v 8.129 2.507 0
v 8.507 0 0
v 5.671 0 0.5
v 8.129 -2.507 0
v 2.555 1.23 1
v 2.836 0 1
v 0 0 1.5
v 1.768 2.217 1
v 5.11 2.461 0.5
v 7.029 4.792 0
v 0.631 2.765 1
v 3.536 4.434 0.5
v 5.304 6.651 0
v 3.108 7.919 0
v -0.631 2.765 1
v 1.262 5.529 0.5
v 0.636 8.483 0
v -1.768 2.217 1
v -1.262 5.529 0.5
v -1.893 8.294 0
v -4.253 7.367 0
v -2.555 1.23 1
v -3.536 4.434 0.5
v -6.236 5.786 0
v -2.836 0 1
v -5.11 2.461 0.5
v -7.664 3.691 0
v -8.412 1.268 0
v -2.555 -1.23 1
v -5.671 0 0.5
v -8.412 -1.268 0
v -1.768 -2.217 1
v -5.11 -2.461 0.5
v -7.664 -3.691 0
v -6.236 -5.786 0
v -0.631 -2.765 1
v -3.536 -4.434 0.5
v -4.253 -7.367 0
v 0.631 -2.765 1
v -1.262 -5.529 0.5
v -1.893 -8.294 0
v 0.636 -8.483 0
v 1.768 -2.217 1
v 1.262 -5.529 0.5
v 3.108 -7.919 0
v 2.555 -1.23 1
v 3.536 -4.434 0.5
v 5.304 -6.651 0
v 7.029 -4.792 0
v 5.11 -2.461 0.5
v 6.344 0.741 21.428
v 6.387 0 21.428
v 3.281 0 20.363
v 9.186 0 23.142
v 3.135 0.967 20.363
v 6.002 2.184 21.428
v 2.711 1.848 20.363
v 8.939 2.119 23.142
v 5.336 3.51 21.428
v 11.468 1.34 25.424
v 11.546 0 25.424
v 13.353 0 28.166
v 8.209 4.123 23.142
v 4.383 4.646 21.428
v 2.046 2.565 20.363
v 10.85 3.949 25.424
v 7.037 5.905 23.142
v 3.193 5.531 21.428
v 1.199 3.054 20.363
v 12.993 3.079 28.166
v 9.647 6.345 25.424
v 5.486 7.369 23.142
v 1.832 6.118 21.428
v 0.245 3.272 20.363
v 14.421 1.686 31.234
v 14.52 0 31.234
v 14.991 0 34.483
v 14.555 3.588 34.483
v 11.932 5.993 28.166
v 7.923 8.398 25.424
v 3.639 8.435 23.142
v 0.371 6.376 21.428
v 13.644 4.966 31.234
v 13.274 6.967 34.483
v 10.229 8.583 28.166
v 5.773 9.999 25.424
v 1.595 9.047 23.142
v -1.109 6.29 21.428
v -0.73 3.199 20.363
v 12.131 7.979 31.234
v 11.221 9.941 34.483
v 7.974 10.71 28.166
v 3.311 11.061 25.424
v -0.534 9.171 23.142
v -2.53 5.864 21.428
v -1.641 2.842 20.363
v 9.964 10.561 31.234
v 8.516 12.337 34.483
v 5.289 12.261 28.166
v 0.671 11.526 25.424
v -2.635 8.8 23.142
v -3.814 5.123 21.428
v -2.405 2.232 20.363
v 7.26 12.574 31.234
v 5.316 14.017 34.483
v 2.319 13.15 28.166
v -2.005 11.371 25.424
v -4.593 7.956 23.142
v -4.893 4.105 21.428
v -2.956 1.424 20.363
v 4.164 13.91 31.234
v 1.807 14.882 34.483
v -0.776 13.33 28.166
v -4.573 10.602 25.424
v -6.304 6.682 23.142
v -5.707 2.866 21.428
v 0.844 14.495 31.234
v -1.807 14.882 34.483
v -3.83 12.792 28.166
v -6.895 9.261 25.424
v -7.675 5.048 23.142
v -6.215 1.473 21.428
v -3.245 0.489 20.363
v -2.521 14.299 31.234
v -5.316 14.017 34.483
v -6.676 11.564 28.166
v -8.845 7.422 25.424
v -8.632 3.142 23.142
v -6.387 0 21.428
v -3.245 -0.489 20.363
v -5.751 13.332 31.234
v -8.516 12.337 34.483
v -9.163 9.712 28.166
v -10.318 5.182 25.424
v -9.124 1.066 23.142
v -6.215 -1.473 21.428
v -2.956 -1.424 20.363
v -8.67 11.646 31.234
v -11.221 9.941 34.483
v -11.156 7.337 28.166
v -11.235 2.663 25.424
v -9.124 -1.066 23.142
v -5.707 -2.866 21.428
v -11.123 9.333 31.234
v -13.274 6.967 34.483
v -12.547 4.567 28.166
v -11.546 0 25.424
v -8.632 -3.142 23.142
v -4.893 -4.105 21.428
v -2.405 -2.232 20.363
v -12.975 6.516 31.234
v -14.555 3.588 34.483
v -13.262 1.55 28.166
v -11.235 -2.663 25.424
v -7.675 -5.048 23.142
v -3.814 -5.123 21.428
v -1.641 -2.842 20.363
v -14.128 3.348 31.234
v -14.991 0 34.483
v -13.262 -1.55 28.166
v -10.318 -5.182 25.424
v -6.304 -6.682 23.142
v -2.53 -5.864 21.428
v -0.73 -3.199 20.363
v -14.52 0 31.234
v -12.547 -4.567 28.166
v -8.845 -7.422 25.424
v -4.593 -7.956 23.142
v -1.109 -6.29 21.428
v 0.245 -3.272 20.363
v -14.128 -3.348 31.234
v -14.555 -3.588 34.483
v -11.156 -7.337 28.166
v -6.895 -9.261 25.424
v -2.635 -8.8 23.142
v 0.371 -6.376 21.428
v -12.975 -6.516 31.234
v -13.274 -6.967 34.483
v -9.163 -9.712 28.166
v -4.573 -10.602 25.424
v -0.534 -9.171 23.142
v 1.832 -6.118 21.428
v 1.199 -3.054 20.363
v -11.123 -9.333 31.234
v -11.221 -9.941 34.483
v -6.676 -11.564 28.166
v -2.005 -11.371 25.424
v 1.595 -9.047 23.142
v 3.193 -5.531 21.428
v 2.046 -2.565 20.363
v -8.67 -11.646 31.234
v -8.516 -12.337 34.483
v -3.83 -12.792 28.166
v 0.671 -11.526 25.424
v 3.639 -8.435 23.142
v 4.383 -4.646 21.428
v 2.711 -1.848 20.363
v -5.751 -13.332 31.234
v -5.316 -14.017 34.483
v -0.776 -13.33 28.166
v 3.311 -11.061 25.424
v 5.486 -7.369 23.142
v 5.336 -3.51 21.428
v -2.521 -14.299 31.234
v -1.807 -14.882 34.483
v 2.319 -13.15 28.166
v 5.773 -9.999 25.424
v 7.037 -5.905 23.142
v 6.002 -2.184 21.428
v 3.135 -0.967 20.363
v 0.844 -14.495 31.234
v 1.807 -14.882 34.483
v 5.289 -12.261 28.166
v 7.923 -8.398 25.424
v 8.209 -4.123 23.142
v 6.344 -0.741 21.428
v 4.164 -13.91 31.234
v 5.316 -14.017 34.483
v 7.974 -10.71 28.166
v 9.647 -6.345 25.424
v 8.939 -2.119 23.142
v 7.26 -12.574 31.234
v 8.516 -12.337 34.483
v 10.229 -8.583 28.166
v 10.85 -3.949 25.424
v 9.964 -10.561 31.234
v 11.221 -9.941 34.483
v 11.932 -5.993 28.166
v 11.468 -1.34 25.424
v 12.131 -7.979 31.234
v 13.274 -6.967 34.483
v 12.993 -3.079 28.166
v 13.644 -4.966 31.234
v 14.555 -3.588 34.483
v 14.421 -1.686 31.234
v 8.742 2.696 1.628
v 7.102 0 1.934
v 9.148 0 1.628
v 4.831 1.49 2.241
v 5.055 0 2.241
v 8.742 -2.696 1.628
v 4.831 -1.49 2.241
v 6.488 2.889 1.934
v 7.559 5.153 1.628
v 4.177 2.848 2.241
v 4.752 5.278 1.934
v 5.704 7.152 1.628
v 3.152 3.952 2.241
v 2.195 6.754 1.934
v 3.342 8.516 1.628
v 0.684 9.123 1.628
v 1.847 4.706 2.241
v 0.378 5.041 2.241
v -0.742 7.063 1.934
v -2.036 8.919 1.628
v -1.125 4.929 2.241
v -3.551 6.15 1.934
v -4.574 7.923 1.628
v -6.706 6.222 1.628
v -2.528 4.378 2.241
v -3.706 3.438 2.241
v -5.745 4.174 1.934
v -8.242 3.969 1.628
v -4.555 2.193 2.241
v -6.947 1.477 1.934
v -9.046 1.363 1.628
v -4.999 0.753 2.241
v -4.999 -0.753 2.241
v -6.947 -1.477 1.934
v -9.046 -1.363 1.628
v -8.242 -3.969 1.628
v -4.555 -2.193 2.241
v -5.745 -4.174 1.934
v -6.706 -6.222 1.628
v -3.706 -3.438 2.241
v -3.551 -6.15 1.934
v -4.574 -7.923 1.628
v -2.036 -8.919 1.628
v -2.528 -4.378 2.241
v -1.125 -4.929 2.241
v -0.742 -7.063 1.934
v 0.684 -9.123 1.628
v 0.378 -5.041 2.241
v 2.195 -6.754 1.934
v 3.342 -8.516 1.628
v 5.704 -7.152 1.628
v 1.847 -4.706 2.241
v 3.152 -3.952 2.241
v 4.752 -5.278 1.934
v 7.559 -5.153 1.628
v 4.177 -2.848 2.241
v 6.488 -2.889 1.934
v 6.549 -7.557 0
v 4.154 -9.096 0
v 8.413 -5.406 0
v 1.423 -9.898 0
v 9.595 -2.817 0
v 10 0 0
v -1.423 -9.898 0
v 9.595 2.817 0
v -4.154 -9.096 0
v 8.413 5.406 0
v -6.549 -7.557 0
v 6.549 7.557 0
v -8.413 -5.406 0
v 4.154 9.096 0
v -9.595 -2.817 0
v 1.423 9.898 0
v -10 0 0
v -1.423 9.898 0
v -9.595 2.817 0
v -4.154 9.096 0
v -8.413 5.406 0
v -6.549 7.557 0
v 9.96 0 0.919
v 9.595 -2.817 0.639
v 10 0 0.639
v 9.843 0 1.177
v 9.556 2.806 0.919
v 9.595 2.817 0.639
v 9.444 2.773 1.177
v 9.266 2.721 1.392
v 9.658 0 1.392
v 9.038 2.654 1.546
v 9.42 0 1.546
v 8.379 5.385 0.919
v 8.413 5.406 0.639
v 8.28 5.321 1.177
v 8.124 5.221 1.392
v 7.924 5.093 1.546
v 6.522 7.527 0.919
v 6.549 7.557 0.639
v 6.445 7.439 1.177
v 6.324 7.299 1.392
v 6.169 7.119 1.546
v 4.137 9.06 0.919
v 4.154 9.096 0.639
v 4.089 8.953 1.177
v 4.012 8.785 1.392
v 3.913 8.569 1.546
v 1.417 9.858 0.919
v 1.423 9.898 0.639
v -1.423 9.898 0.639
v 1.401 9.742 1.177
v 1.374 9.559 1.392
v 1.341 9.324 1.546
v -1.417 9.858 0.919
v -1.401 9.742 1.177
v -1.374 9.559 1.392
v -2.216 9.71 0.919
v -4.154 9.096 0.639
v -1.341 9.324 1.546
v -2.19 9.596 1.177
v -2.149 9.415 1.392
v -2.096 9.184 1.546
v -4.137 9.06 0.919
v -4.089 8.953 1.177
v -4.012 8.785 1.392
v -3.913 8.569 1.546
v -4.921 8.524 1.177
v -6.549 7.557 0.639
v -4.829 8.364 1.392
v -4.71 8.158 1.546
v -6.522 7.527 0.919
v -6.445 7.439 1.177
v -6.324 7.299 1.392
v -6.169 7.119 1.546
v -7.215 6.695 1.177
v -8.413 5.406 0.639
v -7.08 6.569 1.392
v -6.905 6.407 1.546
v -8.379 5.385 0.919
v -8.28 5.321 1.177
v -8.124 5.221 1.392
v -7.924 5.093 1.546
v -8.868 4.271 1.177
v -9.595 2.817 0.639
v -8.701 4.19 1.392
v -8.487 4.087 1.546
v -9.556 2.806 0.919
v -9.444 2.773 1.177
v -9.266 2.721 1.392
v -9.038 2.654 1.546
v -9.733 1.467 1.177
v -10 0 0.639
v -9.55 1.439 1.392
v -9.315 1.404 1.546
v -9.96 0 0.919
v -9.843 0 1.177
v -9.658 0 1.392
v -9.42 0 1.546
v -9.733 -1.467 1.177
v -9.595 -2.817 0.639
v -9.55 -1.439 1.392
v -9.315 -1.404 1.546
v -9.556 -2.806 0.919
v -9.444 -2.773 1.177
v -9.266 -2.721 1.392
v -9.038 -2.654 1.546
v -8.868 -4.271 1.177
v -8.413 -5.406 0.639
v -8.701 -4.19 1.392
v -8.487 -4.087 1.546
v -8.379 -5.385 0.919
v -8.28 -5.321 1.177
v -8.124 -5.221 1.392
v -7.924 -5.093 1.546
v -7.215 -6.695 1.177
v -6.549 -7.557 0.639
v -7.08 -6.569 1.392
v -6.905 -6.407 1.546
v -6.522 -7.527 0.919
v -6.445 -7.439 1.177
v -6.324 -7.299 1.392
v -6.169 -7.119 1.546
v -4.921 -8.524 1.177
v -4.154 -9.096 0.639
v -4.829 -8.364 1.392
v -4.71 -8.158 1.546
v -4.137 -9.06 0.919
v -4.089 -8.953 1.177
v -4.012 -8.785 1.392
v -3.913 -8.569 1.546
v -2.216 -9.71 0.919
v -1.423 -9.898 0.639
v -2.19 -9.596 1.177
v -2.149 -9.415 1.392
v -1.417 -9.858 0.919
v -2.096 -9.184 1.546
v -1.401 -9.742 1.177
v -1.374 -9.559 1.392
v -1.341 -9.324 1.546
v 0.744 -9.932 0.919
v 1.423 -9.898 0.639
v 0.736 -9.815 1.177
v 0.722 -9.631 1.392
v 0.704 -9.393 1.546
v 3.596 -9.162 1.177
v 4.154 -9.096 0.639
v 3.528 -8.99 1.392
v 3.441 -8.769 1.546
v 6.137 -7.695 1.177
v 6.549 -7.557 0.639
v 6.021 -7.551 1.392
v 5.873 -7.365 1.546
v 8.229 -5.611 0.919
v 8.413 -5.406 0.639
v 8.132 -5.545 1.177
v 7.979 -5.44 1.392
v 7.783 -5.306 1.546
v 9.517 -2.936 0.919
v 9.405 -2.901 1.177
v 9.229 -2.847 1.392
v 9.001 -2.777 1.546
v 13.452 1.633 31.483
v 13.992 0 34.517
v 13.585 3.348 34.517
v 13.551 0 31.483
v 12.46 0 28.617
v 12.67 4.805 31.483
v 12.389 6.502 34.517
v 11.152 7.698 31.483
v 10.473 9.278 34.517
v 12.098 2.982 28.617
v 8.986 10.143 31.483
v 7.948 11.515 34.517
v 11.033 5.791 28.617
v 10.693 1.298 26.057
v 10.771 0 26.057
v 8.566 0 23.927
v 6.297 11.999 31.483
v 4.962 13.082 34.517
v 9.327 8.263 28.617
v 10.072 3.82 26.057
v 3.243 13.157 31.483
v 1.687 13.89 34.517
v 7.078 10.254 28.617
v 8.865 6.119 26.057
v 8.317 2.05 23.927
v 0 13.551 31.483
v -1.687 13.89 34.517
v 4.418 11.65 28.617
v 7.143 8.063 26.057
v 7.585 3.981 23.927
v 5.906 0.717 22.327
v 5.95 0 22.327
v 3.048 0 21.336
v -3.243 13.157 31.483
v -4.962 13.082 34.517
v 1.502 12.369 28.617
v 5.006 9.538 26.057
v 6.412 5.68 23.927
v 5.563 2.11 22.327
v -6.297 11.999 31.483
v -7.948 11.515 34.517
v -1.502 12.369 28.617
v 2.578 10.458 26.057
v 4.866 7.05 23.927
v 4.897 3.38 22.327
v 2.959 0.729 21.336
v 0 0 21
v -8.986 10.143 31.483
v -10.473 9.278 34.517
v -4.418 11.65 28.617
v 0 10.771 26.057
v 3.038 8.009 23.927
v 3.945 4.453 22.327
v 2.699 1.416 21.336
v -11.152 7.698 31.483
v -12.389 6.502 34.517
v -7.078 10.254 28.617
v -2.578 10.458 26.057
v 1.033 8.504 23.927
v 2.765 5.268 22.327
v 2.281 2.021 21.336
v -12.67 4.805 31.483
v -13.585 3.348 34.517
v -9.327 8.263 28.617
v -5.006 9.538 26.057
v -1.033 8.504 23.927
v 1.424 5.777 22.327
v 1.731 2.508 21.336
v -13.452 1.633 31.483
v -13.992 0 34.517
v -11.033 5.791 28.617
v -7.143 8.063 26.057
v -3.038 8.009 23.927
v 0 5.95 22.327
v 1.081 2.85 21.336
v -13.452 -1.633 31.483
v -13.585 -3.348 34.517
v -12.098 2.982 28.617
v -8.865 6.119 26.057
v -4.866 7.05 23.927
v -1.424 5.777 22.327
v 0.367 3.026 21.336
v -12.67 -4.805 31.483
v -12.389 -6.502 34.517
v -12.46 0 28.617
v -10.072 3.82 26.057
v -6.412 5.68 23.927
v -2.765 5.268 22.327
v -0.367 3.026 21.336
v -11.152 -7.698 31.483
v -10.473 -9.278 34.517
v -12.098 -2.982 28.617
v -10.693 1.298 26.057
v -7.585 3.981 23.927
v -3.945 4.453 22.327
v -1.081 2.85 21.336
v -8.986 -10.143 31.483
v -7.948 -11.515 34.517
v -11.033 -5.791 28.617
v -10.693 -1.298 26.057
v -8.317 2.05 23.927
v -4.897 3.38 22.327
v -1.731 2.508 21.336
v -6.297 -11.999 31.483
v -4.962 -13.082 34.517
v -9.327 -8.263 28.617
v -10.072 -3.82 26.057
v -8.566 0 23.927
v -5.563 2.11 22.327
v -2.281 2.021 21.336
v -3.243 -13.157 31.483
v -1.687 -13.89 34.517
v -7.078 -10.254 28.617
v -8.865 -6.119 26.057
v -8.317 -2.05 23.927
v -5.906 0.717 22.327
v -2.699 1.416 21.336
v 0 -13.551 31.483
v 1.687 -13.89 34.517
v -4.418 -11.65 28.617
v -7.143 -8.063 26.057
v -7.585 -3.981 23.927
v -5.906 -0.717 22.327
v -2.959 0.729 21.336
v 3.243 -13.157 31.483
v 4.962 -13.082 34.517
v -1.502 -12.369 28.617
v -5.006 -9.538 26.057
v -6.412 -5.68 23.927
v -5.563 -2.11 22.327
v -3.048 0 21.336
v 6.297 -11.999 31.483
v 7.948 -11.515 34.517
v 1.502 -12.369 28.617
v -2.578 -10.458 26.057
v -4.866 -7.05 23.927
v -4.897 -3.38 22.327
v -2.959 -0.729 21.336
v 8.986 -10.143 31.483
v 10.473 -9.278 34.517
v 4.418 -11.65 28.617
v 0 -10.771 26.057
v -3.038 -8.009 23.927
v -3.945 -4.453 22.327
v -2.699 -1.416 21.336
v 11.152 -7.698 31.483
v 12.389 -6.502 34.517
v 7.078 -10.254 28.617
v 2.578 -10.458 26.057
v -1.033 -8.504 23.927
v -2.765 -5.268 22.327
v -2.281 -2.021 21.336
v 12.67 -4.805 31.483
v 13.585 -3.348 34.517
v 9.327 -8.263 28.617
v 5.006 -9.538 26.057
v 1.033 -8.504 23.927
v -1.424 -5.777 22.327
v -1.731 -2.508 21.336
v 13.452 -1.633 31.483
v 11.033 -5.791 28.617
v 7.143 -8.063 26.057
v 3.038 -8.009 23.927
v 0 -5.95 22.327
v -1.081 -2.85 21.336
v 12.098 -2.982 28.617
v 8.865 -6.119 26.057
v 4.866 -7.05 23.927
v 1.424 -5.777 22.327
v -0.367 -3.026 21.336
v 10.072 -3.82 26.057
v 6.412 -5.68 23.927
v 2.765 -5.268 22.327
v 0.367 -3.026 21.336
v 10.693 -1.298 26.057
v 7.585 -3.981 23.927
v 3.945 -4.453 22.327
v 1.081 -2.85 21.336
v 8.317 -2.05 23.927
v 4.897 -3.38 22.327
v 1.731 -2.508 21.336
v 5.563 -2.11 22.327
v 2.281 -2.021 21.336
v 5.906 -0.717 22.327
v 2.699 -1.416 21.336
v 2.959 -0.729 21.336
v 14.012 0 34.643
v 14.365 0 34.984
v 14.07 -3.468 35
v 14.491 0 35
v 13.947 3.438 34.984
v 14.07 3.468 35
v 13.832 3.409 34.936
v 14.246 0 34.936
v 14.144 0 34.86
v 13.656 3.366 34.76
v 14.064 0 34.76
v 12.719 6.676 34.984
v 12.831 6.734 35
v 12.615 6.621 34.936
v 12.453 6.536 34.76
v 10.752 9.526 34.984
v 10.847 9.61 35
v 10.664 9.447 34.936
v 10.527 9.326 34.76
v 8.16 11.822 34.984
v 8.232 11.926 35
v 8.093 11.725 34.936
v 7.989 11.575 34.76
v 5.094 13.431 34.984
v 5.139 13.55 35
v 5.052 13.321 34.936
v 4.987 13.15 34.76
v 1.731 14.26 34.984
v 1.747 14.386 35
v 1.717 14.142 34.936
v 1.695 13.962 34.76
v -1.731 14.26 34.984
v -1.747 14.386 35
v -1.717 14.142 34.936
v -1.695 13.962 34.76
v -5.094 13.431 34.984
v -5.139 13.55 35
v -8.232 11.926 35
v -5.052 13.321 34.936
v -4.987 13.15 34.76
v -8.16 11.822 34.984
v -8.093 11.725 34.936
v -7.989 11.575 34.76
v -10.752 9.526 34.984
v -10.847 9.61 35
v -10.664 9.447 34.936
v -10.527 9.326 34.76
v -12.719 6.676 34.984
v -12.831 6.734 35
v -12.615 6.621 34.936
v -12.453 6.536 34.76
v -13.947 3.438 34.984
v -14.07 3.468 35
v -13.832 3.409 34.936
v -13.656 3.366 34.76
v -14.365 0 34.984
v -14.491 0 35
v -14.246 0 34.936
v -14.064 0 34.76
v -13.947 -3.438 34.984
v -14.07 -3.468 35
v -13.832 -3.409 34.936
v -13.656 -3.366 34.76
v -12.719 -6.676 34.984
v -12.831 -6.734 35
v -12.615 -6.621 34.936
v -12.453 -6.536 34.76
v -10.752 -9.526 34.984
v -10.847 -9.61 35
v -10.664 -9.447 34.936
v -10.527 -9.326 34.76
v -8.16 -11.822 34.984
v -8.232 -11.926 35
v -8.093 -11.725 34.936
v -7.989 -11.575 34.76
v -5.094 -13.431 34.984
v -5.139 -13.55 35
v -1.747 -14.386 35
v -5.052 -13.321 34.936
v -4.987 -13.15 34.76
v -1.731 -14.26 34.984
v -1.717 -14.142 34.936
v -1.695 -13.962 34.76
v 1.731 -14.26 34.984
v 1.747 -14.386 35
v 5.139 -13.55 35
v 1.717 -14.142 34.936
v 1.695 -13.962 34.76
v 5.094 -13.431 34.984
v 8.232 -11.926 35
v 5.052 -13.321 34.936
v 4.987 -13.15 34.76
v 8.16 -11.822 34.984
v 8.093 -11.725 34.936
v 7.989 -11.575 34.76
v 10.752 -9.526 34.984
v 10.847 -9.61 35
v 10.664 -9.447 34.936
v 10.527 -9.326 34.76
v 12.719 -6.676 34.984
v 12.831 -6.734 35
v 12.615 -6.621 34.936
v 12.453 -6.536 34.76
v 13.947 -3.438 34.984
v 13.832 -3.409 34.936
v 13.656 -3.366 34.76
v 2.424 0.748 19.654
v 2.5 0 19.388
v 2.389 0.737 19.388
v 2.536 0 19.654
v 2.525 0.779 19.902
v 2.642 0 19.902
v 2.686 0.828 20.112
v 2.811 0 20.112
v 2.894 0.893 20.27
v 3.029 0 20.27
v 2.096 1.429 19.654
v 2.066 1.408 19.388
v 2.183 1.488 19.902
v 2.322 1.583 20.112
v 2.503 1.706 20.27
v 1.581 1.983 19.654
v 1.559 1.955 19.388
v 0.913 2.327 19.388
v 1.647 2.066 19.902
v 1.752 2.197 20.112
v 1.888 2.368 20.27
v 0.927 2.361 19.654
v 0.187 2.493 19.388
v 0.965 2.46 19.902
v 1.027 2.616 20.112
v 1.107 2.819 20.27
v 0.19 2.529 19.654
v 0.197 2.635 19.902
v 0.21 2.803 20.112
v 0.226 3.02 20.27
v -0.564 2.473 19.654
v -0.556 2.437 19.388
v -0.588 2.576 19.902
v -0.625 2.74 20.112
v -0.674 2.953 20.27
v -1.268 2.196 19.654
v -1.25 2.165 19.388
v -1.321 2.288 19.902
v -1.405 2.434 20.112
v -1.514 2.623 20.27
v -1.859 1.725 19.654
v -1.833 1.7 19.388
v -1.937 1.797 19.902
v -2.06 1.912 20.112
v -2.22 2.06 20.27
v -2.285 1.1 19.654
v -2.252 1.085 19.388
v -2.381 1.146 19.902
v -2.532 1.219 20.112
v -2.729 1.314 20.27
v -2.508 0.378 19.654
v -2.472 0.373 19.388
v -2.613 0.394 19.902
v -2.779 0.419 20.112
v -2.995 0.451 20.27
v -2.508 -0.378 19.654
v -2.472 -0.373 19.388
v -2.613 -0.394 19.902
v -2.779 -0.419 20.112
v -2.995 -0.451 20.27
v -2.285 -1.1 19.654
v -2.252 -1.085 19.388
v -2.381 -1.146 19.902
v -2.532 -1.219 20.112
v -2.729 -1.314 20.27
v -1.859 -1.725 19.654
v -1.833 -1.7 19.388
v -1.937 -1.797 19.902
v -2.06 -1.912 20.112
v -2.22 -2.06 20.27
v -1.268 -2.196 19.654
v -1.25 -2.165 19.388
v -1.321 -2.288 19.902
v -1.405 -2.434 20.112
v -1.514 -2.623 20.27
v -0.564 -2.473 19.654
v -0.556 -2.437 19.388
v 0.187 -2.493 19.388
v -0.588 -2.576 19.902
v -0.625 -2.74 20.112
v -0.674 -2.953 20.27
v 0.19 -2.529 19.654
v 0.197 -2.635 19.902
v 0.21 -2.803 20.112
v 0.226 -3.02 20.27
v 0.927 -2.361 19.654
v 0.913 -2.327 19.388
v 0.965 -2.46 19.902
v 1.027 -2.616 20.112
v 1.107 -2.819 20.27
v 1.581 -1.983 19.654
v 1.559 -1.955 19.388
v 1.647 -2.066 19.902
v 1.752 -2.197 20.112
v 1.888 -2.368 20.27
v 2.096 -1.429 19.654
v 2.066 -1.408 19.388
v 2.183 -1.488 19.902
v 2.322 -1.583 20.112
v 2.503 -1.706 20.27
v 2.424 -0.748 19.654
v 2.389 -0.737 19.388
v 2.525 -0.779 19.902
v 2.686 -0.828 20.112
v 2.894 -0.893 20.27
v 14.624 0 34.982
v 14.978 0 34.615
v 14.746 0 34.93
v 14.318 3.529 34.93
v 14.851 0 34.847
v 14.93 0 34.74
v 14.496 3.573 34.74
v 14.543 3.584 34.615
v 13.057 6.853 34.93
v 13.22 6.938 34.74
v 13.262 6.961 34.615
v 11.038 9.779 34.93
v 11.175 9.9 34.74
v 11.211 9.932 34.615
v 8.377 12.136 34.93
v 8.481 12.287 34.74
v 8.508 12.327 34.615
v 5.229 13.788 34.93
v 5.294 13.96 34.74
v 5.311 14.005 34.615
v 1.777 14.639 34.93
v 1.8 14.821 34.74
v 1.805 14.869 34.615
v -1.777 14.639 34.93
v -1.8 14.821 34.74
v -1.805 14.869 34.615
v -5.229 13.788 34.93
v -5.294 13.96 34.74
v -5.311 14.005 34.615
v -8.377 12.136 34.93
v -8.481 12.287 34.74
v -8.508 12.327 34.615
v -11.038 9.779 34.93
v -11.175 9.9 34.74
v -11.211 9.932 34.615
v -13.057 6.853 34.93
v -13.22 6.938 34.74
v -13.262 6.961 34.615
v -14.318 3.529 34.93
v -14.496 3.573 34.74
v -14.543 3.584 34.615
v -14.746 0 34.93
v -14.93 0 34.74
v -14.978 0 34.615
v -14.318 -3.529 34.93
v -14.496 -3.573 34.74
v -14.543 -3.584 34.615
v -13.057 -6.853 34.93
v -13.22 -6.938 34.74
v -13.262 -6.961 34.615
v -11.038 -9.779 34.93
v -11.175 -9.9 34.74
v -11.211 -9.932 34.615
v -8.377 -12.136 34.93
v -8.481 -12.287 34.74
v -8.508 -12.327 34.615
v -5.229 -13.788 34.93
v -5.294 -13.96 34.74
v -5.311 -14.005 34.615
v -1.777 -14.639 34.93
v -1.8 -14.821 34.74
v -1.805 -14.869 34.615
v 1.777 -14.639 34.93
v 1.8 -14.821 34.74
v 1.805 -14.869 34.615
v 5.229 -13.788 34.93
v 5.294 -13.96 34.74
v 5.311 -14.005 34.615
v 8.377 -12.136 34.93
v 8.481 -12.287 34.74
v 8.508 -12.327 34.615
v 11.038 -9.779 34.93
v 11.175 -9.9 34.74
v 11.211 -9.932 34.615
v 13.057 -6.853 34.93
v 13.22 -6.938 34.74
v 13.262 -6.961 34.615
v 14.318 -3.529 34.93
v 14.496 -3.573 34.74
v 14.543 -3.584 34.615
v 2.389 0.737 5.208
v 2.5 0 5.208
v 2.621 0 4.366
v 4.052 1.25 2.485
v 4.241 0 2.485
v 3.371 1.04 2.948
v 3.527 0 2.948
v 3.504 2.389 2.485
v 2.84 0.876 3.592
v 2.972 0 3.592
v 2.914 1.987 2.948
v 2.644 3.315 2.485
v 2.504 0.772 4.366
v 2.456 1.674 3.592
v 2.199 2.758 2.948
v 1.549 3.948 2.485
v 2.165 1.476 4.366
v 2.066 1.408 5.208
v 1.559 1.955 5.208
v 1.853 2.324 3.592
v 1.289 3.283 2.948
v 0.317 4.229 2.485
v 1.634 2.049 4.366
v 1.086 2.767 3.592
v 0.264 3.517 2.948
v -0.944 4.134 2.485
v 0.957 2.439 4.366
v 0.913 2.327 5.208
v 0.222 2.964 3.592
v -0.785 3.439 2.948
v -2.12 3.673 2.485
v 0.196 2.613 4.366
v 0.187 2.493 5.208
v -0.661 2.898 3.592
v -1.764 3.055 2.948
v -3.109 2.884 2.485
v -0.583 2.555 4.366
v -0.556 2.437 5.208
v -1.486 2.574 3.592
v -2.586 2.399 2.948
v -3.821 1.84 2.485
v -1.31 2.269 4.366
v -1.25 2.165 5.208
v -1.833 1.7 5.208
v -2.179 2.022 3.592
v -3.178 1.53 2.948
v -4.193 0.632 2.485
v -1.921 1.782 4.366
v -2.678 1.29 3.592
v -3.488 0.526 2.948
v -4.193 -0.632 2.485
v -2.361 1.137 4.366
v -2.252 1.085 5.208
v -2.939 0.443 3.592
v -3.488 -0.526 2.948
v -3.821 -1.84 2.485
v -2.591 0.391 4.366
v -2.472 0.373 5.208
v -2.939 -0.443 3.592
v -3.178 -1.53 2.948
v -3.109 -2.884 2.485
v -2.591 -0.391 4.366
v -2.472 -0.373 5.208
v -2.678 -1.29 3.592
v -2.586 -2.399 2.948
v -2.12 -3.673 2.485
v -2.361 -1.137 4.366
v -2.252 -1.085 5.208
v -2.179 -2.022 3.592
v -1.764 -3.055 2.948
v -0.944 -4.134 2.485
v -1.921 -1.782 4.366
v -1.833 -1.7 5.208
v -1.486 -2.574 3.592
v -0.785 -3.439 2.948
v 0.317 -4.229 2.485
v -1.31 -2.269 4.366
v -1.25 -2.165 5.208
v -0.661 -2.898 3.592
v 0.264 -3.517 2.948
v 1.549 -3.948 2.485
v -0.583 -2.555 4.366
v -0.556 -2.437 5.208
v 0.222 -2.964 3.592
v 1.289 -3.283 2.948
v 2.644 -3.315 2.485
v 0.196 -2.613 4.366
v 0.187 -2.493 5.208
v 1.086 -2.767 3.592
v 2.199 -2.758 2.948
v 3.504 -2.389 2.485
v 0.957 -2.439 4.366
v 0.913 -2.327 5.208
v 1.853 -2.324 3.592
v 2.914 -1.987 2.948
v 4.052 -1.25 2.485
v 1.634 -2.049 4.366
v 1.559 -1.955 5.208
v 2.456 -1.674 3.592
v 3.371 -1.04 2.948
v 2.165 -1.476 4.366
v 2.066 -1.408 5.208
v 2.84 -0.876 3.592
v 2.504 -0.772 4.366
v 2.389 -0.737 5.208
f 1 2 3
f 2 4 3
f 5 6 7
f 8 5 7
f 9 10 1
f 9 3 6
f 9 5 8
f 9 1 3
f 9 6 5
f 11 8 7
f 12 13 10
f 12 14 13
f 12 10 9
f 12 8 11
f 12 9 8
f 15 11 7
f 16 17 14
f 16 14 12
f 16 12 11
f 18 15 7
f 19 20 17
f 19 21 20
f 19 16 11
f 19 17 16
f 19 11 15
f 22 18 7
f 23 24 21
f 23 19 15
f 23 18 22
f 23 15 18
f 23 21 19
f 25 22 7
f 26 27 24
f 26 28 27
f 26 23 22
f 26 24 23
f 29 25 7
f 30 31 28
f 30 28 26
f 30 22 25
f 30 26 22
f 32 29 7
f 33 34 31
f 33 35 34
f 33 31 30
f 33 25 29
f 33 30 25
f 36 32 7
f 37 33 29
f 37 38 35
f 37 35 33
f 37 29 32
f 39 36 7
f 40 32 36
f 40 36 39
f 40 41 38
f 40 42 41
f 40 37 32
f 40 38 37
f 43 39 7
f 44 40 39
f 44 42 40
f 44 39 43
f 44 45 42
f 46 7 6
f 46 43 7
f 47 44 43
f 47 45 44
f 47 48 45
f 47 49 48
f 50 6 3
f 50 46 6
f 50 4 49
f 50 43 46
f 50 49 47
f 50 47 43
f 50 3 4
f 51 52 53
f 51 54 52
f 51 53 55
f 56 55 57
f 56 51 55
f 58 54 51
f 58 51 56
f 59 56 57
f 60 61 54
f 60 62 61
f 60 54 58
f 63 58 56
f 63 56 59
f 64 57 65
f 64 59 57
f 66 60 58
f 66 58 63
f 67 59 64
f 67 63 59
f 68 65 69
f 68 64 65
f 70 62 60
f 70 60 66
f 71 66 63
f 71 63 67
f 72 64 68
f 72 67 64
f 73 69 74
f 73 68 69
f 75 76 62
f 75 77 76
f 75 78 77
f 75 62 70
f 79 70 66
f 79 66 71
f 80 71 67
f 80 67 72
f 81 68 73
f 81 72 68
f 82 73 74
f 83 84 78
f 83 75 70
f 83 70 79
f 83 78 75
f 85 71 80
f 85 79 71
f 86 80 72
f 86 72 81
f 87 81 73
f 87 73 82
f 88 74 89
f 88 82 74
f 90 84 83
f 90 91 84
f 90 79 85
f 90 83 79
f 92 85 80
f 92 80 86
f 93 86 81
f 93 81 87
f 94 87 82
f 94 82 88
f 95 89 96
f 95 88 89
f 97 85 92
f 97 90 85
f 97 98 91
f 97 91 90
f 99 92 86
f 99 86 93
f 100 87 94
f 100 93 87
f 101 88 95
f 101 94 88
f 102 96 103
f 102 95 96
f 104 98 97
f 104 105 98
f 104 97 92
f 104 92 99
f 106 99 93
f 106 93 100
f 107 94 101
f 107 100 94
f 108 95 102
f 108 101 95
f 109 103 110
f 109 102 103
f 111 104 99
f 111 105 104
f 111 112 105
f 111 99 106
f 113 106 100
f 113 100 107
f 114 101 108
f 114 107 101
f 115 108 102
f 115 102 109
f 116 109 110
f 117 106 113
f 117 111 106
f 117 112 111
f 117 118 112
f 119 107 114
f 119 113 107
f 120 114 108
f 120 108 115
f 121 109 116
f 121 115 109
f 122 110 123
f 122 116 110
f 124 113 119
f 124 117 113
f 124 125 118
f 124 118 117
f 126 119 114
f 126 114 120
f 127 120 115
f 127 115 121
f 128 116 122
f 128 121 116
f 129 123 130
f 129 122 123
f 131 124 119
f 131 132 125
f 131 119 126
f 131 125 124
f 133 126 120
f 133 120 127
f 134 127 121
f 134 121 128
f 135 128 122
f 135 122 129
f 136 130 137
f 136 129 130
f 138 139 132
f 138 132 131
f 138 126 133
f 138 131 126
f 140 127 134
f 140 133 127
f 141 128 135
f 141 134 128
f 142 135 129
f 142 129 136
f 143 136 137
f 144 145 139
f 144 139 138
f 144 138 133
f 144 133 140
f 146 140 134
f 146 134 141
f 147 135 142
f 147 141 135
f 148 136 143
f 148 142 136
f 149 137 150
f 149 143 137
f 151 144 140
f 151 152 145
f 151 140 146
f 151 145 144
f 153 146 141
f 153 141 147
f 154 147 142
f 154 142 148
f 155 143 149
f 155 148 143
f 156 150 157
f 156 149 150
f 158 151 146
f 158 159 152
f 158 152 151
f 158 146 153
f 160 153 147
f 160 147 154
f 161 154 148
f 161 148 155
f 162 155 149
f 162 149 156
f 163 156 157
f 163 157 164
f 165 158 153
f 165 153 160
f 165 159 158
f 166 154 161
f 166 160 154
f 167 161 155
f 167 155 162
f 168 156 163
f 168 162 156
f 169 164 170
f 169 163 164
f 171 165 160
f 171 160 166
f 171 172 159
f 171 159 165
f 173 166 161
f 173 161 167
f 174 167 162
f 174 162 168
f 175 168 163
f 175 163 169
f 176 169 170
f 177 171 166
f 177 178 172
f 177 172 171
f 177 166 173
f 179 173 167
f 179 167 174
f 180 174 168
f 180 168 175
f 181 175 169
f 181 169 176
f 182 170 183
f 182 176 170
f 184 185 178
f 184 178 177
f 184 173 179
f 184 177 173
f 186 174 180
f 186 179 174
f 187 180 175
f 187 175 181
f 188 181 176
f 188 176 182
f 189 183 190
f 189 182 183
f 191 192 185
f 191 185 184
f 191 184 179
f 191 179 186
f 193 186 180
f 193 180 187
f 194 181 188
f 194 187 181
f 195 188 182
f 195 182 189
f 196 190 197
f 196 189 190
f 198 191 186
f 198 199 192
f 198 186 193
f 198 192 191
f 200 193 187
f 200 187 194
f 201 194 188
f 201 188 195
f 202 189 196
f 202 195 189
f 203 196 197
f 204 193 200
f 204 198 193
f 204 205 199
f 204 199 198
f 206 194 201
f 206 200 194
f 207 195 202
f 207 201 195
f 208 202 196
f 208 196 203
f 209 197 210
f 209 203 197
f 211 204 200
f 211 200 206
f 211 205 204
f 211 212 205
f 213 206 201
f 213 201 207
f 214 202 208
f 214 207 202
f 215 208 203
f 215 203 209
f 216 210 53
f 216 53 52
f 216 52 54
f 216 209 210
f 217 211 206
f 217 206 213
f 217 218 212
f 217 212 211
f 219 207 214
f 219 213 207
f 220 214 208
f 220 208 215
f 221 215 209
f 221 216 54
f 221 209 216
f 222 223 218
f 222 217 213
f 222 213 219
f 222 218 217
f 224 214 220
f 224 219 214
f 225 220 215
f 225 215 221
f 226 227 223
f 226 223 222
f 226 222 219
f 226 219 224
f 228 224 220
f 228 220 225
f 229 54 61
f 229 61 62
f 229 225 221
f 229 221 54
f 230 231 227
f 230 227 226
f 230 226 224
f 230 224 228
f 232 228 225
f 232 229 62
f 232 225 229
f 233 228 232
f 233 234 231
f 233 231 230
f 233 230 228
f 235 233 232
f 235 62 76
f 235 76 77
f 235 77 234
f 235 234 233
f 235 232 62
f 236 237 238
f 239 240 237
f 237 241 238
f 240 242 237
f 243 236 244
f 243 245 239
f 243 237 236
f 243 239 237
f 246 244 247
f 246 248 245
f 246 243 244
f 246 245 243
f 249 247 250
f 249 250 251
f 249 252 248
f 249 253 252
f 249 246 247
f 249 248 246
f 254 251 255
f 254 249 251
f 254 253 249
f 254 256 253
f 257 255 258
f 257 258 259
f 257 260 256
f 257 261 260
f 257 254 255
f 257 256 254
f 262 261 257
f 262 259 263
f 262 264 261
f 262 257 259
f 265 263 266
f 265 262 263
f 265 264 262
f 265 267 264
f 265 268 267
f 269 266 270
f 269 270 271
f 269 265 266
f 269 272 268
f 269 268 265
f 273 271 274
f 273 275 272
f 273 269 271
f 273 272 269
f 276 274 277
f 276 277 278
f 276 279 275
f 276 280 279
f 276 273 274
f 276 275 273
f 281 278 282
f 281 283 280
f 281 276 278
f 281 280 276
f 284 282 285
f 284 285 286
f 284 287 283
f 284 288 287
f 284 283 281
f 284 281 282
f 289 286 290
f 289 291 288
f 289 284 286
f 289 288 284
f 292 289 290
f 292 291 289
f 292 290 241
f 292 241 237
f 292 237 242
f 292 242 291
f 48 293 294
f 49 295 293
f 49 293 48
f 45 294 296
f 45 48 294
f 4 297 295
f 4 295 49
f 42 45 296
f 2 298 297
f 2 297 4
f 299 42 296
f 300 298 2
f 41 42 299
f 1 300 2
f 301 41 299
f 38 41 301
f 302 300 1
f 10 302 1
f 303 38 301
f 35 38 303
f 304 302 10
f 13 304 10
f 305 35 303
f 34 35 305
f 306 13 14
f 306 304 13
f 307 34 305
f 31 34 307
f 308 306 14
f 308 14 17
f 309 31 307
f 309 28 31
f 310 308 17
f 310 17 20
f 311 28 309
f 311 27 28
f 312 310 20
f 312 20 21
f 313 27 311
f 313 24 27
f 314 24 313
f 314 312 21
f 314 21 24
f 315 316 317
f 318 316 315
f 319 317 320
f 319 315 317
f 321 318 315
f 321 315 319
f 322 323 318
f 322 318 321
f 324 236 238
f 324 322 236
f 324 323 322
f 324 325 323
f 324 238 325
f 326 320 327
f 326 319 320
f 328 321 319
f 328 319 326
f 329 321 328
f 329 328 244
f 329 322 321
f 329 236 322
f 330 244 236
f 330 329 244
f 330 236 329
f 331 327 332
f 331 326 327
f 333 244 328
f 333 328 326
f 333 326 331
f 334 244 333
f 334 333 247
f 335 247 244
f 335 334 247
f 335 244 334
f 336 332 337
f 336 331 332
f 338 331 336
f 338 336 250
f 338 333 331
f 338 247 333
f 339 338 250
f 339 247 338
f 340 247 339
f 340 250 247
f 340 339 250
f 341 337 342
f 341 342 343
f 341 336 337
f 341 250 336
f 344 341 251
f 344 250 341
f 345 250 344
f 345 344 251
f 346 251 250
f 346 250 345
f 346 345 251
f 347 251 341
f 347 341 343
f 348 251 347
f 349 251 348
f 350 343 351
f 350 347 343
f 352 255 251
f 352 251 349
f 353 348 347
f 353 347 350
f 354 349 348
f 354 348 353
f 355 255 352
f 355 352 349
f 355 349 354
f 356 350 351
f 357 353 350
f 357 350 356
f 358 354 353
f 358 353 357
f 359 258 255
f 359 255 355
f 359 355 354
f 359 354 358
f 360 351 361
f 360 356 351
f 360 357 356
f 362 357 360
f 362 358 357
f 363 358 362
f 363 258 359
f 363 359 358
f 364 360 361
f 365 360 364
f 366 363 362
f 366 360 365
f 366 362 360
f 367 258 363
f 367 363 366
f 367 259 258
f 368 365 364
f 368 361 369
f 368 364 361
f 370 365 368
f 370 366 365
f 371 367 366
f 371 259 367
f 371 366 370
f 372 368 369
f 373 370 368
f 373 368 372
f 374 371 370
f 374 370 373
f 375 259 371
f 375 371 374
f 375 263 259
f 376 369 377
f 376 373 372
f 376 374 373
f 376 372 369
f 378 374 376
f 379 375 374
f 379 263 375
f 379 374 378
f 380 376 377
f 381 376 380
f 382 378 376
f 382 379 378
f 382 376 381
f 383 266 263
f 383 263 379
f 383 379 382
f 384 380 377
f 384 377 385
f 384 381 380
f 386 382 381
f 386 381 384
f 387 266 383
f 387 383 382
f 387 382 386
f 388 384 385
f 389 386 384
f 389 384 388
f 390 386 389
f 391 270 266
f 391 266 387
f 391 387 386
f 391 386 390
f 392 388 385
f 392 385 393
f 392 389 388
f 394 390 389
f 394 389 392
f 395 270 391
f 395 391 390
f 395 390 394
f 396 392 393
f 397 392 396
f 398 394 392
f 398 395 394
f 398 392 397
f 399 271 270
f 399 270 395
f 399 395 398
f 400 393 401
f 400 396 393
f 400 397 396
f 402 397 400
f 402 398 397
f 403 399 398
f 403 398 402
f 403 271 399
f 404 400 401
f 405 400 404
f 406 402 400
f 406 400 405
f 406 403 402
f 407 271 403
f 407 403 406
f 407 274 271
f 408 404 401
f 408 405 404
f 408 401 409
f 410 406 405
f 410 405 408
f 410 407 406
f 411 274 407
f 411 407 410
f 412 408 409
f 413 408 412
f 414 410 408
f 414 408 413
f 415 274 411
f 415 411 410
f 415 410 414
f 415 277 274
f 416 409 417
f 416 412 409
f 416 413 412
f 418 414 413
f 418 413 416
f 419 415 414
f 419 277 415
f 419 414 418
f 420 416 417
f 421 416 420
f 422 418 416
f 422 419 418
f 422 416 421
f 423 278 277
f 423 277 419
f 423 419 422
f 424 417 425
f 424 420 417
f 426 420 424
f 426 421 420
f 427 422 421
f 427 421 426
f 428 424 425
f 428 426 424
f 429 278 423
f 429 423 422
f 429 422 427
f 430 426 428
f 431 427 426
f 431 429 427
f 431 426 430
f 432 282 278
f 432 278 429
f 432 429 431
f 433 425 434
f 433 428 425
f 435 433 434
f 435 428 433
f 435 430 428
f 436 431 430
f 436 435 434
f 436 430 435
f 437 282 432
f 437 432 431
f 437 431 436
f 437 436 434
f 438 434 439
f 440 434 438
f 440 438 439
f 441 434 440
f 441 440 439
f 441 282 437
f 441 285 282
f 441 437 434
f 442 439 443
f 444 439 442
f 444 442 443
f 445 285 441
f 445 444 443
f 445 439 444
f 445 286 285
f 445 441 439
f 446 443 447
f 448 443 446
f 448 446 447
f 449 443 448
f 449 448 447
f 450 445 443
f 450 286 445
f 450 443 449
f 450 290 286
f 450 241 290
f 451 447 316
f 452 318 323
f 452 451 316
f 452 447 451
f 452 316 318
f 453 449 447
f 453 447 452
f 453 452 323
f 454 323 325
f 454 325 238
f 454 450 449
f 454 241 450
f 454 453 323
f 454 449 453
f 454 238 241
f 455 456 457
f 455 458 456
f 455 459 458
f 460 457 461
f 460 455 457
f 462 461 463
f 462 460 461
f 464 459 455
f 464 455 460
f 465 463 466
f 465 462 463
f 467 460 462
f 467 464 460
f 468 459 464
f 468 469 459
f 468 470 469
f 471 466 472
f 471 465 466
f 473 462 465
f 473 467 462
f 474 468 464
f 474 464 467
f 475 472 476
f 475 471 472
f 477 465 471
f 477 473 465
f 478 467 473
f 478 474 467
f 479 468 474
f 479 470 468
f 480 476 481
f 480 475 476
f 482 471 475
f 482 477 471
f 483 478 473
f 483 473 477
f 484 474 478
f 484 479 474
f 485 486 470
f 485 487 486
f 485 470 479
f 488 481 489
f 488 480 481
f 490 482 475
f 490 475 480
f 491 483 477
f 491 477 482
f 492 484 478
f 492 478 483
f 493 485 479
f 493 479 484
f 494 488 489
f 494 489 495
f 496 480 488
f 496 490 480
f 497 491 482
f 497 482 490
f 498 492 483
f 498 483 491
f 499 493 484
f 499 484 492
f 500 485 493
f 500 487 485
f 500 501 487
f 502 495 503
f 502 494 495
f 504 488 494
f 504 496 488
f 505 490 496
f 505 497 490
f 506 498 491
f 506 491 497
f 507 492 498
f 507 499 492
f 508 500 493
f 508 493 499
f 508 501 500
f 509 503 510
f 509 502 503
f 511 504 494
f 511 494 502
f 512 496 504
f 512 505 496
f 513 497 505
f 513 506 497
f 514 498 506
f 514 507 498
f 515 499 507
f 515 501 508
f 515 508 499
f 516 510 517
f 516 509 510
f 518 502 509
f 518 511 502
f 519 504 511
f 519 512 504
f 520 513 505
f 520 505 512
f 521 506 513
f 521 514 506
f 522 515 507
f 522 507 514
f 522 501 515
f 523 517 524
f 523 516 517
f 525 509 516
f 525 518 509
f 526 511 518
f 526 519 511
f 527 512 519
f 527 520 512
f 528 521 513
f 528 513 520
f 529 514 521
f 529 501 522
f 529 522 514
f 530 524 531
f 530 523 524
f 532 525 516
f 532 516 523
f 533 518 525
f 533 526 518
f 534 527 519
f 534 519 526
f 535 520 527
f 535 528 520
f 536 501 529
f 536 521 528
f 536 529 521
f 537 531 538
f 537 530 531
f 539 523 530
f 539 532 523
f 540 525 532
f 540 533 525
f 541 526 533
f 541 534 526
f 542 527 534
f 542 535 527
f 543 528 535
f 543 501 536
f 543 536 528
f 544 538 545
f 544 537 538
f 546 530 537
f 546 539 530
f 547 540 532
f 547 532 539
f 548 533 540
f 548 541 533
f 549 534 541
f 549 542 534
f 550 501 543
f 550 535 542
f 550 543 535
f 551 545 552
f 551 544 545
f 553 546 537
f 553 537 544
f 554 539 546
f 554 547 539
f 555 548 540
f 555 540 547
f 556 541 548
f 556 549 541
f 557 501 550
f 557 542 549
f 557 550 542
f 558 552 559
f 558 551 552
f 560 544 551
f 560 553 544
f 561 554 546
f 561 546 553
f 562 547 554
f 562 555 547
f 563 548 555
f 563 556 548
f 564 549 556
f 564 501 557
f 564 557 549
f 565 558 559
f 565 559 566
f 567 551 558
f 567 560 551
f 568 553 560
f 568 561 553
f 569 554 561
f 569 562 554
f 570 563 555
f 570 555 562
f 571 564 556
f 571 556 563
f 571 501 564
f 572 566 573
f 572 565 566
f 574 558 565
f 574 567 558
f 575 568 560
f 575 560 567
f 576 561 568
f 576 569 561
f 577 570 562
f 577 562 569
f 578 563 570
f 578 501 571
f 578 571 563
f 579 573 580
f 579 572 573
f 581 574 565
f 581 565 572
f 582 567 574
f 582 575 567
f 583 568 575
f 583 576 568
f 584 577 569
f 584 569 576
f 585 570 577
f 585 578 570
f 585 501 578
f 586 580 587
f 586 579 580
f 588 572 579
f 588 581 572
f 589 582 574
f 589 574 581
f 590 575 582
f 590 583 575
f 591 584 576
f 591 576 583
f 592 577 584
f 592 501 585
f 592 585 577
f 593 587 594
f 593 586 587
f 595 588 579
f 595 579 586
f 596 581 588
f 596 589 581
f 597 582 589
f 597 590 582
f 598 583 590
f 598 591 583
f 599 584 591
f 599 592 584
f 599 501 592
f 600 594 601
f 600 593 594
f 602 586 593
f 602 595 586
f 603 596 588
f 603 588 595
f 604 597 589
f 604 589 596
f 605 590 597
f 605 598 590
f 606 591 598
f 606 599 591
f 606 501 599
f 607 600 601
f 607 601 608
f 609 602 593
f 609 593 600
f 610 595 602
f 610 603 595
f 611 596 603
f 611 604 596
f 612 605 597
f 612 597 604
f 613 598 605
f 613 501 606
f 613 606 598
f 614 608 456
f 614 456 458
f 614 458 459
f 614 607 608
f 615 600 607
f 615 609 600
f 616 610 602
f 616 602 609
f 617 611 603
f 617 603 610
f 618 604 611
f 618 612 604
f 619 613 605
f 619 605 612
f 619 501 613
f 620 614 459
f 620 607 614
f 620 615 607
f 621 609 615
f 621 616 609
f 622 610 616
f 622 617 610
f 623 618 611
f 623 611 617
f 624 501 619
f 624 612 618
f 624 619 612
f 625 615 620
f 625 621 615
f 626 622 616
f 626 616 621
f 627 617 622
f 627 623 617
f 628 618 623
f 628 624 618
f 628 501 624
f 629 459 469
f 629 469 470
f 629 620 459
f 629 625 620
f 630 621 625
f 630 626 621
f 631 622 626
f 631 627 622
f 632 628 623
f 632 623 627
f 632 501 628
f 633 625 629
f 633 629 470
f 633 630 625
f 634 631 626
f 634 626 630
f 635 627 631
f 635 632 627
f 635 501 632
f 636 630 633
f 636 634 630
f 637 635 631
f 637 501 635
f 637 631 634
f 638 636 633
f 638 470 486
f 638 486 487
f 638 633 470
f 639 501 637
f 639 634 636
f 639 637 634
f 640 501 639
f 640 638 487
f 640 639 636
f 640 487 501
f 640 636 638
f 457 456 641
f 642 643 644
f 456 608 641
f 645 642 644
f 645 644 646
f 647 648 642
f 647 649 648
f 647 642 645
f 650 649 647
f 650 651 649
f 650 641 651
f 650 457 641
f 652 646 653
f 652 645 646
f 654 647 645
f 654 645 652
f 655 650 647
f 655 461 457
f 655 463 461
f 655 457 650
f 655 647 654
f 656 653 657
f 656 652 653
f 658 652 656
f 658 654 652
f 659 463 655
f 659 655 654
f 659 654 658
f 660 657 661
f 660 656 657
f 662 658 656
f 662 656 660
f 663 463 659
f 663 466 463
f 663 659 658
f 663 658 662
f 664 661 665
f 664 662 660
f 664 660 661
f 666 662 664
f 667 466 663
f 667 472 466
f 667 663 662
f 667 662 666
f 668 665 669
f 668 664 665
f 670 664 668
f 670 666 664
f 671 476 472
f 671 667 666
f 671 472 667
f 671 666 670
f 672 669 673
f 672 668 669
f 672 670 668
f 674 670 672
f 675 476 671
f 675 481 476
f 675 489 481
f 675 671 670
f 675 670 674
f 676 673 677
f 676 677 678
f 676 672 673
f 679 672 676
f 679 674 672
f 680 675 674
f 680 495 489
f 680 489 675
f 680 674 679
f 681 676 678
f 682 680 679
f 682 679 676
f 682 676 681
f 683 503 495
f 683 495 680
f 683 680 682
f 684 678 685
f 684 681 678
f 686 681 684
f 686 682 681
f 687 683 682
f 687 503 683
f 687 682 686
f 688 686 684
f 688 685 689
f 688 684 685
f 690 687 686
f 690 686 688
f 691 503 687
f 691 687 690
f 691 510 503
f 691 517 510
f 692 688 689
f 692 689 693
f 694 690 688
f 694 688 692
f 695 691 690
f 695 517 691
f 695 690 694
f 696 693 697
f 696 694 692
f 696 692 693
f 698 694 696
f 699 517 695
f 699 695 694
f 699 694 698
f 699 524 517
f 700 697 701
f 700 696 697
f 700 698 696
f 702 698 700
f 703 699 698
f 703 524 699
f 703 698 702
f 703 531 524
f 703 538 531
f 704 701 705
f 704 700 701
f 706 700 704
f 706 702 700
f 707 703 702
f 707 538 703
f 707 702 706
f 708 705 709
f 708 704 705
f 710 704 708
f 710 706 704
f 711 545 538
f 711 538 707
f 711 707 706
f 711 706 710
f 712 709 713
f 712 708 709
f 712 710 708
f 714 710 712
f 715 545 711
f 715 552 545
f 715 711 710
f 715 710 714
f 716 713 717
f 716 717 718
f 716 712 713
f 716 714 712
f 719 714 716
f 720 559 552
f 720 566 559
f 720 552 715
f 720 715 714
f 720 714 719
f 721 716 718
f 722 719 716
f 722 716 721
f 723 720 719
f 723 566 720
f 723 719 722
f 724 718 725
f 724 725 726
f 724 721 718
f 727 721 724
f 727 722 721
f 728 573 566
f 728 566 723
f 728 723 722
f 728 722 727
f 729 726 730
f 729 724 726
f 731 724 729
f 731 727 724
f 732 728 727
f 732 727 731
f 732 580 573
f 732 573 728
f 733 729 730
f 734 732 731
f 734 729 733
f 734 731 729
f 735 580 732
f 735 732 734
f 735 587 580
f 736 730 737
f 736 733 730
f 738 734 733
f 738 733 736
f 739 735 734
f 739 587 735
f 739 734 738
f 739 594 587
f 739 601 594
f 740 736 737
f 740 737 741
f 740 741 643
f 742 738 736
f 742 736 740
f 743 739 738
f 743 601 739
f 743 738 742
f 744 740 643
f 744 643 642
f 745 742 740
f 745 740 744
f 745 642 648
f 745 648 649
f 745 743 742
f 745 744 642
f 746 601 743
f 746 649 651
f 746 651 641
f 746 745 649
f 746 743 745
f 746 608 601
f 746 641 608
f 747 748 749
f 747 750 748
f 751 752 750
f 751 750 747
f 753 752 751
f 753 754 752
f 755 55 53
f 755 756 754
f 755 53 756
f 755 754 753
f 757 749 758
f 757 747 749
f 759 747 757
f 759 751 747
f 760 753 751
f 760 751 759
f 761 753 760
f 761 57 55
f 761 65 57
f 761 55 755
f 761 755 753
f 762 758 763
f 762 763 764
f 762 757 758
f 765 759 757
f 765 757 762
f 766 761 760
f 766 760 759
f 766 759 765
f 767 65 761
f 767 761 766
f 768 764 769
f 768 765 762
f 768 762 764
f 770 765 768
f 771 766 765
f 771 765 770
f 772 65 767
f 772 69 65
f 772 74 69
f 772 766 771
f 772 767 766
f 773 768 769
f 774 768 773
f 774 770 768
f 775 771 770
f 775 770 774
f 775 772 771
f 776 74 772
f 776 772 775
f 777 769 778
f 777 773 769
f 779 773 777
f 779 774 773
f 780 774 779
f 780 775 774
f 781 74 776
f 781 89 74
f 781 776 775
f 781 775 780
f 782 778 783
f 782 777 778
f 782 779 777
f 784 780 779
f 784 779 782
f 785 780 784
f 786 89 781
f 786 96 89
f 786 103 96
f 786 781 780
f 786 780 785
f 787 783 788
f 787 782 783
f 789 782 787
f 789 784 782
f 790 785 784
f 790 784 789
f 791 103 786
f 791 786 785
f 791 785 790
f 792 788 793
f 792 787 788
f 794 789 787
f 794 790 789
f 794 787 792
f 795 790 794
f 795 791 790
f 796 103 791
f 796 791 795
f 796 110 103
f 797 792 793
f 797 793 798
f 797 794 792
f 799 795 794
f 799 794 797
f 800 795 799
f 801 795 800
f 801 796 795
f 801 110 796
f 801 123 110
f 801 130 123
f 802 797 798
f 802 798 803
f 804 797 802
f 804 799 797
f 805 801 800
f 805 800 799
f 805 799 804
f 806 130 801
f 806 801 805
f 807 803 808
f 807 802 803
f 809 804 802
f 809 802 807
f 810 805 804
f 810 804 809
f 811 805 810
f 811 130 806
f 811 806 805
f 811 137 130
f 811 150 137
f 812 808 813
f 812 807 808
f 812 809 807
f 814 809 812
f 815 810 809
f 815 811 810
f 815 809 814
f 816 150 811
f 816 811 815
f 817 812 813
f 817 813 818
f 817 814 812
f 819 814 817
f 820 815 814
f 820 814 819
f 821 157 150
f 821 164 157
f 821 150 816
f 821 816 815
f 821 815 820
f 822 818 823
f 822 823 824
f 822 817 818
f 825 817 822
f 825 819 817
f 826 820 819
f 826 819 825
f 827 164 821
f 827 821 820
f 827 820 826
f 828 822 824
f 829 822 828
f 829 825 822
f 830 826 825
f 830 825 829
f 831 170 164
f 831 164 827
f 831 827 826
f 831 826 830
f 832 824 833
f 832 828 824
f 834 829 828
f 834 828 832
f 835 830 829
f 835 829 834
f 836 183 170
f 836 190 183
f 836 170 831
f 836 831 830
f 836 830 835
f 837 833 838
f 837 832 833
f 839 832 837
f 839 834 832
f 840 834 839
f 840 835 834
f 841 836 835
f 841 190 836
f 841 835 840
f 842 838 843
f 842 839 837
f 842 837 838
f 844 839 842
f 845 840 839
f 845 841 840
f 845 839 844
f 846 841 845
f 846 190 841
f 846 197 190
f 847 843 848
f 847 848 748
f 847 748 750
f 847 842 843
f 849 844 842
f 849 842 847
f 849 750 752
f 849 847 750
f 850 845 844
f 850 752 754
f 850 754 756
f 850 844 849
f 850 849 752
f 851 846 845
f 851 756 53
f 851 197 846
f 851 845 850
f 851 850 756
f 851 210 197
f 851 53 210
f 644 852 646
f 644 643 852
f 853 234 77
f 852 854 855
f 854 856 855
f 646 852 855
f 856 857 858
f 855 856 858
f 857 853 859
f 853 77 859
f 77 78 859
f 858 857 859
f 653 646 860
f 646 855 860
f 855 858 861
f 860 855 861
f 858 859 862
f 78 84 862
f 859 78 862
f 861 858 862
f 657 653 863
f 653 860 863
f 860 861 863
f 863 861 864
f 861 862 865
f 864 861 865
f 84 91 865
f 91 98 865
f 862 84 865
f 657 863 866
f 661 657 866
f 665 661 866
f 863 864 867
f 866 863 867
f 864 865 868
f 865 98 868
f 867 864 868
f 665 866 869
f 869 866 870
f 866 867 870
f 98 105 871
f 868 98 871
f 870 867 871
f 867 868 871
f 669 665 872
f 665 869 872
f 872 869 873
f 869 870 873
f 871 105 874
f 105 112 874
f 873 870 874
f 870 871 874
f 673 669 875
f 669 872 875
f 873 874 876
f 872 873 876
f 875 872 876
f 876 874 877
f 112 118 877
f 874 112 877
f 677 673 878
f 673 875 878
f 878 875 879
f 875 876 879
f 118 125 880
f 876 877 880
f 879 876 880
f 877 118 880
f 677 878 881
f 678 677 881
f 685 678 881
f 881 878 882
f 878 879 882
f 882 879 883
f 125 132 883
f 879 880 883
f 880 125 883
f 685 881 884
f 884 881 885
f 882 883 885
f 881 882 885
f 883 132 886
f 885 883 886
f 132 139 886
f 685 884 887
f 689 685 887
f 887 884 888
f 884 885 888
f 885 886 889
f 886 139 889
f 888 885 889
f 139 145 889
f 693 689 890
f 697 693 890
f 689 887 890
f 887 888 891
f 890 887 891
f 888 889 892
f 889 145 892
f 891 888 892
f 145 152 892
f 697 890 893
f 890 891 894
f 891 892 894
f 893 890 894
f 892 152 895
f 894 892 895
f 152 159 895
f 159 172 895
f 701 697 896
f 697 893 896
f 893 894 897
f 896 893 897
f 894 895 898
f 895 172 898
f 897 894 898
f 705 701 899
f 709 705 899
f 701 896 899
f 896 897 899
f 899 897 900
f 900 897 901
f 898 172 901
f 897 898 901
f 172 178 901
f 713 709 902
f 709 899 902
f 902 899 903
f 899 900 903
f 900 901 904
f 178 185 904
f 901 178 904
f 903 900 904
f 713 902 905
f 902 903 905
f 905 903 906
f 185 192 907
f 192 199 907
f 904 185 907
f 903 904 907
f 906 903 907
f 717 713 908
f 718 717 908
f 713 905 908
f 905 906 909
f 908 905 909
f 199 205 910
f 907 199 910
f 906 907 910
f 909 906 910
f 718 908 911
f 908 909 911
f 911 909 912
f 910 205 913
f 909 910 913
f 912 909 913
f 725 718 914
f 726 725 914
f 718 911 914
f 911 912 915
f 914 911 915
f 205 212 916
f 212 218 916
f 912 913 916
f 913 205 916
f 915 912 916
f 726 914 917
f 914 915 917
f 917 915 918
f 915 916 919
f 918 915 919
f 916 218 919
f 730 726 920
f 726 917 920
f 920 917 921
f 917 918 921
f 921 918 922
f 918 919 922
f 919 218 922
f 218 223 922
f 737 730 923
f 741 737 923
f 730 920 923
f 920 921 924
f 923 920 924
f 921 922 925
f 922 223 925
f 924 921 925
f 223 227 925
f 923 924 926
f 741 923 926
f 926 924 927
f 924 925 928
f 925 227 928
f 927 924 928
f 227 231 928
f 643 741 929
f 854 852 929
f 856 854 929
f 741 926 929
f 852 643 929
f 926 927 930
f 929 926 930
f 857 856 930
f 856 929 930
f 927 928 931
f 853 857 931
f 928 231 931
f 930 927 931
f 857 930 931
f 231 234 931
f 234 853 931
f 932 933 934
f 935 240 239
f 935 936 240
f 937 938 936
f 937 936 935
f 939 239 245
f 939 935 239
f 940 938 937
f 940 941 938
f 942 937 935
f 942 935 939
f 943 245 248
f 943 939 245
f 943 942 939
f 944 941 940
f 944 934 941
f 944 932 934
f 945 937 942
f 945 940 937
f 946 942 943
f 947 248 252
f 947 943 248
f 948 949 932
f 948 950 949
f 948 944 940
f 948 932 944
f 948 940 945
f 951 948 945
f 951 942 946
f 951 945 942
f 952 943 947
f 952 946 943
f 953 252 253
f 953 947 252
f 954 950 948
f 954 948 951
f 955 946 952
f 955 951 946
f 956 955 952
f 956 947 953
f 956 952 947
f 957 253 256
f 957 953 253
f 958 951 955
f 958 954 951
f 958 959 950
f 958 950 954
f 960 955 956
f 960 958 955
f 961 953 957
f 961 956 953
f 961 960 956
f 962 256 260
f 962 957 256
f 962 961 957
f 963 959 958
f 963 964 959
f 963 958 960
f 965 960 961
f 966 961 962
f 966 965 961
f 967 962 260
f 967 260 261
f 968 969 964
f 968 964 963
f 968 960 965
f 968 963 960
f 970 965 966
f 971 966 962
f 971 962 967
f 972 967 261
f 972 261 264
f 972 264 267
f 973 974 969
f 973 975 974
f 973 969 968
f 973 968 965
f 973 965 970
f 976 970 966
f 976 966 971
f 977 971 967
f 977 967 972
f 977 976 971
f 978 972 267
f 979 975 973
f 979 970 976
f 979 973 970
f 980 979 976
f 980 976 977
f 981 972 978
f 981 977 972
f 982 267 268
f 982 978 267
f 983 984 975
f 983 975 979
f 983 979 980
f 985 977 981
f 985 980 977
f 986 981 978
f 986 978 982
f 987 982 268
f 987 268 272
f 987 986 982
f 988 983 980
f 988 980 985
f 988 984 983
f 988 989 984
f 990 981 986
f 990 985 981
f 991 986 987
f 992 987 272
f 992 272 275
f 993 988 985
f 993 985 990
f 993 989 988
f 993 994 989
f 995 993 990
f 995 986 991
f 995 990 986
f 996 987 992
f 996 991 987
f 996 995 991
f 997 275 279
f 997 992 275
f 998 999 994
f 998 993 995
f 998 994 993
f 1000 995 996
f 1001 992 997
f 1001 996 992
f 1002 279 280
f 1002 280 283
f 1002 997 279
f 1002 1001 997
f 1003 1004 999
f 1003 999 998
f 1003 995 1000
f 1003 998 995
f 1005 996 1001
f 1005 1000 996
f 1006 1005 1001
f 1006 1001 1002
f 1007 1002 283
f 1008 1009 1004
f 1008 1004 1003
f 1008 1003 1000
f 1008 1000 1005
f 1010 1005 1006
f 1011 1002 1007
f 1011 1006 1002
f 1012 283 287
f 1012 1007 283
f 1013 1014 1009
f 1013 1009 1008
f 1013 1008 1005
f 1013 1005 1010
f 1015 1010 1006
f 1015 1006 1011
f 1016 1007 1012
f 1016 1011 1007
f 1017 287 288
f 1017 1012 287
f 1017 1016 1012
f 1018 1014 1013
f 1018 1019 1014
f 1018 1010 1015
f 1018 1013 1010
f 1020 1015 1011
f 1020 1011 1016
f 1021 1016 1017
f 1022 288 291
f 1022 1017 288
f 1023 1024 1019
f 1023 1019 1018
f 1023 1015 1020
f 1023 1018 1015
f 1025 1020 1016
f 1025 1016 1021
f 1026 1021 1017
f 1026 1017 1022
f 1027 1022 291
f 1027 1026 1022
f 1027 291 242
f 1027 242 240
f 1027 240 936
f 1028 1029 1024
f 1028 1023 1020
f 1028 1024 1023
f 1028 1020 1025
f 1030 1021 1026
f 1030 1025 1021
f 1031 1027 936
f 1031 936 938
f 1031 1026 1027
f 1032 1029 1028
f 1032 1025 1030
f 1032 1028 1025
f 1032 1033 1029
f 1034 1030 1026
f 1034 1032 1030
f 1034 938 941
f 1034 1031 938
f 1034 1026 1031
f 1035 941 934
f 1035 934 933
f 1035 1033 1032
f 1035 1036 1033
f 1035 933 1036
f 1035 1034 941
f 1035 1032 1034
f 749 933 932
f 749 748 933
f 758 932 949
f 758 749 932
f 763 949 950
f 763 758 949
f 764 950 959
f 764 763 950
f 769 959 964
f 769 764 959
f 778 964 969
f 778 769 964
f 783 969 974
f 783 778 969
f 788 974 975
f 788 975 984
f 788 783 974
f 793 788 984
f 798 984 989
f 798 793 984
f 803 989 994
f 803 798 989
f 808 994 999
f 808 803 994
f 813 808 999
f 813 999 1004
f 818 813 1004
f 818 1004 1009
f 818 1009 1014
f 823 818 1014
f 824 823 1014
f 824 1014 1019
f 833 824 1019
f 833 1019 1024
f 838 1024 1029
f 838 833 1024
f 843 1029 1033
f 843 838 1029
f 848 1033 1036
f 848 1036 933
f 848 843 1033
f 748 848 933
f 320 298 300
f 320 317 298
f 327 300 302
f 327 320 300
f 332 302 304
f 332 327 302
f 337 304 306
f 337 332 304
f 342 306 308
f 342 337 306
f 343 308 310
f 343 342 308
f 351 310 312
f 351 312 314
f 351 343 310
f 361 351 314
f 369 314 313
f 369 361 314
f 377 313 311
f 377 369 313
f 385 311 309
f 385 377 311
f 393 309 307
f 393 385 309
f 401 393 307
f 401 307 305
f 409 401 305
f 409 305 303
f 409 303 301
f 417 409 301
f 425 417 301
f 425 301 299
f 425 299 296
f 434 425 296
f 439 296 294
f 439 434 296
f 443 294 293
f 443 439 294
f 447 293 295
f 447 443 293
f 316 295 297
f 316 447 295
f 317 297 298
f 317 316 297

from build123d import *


# Not quite as in the source:
# - a fillet or chamfer that OpenCascade refuses, or shapes differently, is made with other operations: its cross-section is extruded or revolved along the edge and cut away or added


with BuildPart() as f1:
    # F0 (on Front) → F1 (revolve)
    with BuildSketch(Plane.XZ):
        with BuildLine():
            Line((0, 21), (0, 1.5))
            Line((0, 1.5), (8.5069227294, 0))
            Line((8.5069227294, 0), (10, 0))
            Line((10, 0), (10, 0.638732829))
            ThreePointArc((10, 0.638732829), (9.7577103301, 1.2913238615), (9.1482498888, 1.6276827623))
            Line((9.1482498888, 1.6276827623), (5.0552503337, 2.2412494438))
            ThreePointArc((5.0552503337, 2.2412494438), (3.2268690096, 3.2503261462), (2.5, 5.2080992435))
            Line((2.5, 5.2080992435), (2.5, 19.387505004))
            ThreePointArc((2.5, 19.387505004), (2.7193752502, 20.012505004), (3.28125, 20.3632859413))
            ThreePointArc((3.28125, 20.3632859413), (11.709371247, 25.625), (15, 35))
            Line((15, 35), (14, 35))
            ThreePointArc((14, 35), (9.8994949366, 25.1005050634), (0, 21))
        make_face()
    revolve(axis=Axis((0, 0, 19.0814351663), (0, 0, 1)))

    # F2: fillet of radius 0.5 on 2 edges, made by hand

    # F2_s1 → F2_t2 (revolve, cut)
    with BuildSketch(Plane.XZ):
        with BuildLine():
            ThreePointArc((14.4913767462, 35), (14.1439725793, 34.8595974761), (13.9916740998, 34.5172413793))
            ThreePointArc((13.9916740998, 34.5172413793), (13.9979183702, 34.7585847941), (14, 35))
            Line((14, 35), (14.4913767462, 35))
        make_face()
    revolve(axis=Axis((0, 0, 35), (0, 0, 1)), mode=Mode.SUBTRACT)

    # F2_s3 → F2_t4 (revolve, cut)
    with BuildSketch(Plane.XZ):
        with BuildLine():
            ThreePointArc((14.4913767462, 35), (14.8509742223, 34.8474041669), (14.9910793926, 34.4827586207))
            ThreePointArc((14.9910793926, 34.4827586207), (14.9977696823, 34.7413408509), (15, 35))
            Line((15, 35), (14.4913767462, 35))
        make_face()
    revolve(axis=Axis((0, 0, 35), (0, 0, 1)), mode=Mode.SUBTRACT)


solid = f1.part
